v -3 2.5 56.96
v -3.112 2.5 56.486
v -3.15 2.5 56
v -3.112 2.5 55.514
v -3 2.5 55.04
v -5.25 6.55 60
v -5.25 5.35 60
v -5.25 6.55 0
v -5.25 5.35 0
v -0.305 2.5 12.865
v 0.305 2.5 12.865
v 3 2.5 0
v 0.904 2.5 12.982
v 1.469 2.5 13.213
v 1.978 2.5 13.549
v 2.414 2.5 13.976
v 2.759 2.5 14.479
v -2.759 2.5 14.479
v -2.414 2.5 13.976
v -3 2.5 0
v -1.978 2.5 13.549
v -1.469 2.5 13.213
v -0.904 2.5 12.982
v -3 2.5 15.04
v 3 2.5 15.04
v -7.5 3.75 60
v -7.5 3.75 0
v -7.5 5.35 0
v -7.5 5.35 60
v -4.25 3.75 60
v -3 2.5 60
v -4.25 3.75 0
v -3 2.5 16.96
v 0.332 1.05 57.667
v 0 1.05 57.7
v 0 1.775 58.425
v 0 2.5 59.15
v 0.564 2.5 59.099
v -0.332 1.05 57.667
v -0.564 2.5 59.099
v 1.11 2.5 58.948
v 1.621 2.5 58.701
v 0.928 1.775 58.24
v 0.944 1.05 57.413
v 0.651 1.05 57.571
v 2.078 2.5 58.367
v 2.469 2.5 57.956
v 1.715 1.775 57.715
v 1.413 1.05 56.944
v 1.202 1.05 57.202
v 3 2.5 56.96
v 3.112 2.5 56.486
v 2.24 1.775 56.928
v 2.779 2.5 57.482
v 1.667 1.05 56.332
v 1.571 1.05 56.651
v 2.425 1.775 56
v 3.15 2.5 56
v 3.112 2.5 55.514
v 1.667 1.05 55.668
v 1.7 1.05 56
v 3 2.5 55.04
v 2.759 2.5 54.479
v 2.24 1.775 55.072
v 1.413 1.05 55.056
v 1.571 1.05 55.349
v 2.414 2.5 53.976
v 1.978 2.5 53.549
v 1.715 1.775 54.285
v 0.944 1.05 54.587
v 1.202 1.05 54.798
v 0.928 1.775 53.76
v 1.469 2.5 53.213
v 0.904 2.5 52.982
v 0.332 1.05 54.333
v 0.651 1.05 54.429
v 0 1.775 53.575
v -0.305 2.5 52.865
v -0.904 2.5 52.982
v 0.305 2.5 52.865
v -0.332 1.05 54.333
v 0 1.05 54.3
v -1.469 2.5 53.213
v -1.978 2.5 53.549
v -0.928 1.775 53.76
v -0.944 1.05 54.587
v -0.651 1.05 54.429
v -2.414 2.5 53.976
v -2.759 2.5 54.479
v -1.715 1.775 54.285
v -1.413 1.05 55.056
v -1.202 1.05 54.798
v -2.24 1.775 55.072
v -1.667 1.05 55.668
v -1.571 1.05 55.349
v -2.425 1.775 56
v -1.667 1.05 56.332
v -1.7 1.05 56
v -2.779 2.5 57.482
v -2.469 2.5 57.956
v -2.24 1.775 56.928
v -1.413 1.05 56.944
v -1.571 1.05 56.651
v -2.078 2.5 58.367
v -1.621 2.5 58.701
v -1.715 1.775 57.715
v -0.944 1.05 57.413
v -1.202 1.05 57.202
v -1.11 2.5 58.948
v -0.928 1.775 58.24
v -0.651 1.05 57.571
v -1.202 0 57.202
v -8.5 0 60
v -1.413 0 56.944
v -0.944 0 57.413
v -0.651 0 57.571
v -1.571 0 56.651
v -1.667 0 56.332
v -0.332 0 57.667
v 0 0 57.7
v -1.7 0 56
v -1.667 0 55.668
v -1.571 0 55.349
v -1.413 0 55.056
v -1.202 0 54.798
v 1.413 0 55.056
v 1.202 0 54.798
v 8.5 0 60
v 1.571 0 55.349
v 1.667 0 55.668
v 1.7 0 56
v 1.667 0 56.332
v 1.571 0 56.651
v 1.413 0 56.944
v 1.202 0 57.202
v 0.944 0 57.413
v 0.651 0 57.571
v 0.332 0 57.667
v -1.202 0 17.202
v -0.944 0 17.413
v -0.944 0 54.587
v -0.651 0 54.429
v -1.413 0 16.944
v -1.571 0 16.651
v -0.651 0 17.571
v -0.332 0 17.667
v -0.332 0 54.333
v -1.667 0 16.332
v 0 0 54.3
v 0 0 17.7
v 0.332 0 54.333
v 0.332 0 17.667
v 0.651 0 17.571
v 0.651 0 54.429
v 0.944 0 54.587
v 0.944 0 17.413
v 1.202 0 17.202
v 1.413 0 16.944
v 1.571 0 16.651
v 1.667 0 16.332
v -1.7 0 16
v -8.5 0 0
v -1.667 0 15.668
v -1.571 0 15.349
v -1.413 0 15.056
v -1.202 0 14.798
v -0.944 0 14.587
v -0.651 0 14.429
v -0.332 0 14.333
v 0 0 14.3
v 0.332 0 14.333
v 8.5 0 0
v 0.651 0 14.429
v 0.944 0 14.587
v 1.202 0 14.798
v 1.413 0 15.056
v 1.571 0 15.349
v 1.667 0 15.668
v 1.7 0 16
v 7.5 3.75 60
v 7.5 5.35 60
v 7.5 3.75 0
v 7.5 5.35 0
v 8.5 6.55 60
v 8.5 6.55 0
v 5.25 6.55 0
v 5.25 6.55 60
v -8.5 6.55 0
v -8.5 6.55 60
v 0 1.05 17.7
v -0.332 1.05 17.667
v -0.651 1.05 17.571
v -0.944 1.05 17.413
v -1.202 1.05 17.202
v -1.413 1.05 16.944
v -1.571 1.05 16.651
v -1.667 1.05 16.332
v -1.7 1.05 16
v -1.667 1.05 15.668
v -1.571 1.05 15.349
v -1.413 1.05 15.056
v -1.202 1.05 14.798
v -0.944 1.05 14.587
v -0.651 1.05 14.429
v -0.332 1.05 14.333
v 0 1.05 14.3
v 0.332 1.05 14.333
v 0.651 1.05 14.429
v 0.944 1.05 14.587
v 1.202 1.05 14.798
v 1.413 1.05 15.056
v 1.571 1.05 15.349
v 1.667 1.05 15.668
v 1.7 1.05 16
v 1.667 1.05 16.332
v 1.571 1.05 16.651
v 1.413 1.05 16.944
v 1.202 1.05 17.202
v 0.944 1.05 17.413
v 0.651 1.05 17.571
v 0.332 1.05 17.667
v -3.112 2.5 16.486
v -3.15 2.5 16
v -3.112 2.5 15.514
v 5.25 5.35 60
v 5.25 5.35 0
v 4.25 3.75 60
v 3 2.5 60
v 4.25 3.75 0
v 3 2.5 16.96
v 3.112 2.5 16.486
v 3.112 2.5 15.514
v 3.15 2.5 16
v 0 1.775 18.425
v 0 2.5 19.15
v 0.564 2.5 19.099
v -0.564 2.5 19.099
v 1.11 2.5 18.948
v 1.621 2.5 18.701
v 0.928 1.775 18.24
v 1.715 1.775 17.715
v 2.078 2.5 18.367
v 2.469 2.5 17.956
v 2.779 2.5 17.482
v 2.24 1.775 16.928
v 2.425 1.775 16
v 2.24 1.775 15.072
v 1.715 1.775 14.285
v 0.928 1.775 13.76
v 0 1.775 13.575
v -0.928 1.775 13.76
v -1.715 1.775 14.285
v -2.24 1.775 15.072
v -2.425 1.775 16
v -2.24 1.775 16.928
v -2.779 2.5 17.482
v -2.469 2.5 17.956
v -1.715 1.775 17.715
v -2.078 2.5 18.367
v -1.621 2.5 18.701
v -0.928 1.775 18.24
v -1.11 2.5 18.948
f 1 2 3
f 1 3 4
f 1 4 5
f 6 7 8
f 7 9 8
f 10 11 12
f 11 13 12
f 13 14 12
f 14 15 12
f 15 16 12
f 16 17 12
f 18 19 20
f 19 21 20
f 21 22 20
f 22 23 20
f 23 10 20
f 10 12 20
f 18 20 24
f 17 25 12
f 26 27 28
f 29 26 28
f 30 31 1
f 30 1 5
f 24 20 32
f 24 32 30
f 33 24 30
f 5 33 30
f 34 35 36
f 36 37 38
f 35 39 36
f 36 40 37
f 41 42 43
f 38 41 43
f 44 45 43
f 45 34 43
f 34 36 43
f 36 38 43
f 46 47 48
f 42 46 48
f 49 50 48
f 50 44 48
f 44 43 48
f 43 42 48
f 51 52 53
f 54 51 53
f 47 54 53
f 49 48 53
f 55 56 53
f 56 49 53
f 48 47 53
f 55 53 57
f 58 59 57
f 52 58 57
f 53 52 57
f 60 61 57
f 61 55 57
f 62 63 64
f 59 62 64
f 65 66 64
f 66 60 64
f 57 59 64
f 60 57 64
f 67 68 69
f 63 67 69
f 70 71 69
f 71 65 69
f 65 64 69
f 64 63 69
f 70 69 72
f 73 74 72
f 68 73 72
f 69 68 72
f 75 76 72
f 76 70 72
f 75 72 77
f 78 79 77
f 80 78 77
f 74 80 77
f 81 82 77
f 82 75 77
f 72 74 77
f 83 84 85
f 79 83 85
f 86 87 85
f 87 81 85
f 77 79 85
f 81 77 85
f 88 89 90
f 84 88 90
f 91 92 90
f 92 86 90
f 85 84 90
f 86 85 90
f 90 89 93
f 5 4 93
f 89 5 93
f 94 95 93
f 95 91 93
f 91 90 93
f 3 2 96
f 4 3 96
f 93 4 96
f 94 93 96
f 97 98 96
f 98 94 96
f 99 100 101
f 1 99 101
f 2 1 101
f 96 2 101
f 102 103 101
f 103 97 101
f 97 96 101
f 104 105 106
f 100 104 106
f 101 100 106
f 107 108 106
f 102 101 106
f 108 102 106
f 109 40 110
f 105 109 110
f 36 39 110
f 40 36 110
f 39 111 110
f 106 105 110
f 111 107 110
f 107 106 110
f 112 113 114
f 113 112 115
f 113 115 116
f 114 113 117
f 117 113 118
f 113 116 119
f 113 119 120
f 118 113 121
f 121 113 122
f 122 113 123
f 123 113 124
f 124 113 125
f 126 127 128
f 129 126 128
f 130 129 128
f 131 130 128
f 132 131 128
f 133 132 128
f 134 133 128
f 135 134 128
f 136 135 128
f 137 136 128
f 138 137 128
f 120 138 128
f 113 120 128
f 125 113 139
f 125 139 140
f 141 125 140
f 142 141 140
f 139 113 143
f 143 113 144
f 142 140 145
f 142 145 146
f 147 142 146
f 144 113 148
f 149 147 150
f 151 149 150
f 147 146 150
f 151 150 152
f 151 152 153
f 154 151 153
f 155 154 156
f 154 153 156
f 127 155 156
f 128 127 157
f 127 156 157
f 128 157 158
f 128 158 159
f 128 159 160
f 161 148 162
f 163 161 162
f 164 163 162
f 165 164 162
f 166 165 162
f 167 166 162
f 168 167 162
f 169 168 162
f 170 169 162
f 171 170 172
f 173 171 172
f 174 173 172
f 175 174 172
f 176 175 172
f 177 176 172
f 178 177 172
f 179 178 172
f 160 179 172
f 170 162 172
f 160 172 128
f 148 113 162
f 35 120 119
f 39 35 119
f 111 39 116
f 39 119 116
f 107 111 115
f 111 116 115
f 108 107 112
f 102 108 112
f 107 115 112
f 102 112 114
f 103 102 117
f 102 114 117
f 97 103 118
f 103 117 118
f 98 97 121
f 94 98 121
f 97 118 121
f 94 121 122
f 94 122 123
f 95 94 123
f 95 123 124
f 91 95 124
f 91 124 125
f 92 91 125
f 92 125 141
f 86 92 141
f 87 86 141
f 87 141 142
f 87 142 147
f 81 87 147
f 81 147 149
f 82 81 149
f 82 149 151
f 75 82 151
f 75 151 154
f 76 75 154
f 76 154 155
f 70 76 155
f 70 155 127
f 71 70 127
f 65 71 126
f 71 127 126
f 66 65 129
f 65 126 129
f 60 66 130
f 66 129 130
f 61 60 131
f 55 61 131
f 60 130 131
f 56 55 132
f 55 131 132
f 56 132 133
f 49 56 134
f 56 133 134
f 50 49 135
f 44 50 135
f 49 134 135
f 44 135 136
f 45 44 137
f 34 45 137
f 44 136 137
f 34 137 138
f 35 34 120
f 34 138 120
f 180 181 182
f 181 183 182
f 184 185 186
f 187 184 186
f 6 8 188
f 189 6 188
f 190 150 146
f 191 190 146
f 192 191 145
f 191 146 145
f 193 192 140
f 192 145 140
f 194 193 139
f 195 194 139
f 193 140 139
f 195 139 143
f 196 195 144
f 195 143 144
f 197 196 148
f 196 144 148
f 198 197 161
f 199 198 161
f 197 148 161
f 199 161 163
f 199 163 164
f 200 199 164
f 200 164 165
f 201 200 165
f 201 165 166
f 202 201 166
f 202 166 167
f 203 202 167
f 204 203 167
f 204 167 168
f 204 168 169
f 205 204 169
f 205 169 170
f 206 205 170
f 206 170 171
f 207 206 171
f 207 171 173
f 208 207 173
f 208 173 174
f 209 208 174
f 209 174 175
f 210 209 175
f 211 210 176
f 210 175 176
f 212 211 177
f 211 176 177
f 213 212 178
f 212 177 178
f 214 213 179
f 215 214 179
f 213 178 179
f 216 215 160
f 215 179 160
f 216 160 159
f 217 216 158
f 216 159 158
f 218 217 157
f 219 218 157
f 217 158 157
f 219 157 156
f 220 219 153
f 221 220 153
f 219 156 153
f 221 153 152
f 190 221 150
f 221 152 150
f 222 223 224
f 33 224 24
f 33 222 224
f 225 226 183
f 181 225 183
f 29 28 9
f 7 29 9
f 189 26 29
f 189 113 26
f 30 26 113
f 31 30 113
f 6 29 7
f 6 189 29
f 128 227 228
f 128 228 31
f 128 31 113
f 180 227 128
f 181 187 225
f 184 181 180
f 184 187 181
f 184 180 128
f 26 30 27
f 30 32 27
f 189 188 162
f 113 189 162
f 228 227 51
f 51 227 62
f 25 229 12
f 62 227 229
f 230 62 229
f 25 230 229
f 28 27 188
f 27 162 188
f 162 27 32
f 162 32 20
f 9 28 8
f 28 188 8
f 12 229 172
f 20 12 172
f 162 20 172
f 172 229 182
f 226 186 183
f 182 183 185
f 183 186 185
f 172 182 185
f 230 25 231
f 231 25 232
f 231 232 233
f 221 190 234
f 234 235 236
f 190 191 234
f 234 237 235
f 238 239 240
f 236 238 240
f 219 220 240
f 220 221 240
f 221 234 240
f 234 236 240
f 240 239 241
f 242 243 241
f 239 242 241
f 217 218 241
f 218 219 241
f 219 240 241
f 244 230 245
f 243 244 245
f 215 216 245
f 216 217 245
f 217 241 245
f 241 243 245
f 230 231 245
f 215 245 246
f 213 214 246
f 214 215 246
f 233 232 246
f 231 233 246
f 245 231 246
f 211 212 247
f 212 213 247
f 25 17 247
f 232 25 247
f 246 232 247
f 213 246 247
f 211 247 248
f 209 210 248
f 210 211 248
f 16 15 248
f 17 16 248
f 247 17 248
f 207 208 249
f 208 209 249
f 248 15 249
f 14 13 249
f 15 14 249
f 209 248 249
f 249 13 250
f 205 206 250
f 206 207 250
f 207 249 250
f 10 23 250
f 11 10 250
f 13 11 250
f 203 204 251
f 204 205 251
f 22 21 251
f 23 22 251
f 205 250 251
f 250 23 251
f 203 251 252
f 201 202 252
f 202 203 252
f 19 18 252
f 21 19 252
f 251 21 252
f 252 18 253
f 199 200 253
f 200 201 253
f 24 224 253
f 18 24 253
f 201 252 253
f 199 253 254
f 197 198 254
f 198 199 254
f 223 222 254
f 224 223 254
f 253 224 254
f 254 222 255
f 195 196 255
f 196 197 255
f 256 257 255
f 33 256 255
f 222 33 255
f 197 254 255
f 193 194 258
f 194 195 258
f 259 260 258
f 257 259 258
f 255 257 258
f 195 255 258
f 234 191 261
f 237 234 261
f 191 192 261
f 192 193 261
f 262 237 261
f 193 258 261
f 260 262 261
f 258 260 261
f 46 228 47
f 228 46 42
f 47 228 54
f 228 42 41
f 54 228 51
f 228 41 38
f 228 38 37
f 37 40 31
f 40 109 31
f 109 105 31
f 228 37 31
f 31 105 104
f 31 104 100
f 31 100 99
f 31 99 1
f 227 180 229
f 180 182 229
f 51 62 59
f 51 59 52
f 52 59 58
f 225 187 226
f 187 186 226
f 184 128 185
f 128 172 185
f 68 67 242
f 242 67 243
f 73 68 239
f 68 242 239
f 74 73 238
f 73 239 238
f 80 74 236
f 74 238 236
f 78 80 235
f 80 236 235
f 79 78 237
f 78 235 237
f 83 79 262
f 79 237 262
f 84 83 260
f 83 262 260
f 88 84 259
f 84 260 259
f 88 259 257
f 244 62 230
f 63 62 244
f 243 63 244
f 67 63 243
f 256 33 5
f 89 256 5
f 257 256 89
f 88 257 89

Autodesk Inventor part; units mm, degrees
ref_plane "YZ Plane" through (0, 0, 0) normal (1, 0, 0) x (0, 1, 0)
ref_plane "XZ Plane" through (0, 0, 0) normal (0, 1, 0) x (-1, 0, 0)
ref_plane "XY Plane" through (0, 0, 0) normal (0, 0, 1) x (1, 0, 0)
sketch "Skizze1" plane through (0, 0, 0) normal (0, 0, 1) x (1, 0, 0)
  line L0 (-7.5, 5.35) -> (-5.25, 5.35)
  line L1 (-5.25, 5.35) -> (-5.25, 6.55)
  line L2 (-5.25, 6.55) -> (-8.5, 6.55)
  line L3 (-8.5, 6.55) -> (-8.5, 0)
  line L4 (-8.5, 0) -> (0, 0)
  line L5 (0, 0) -> (0, 2.5)
  line L6 (-4.25, 3.75) -> (-7.5, 3.75)
  line L7 (-7.5, 3.75) -> (-7.5, 5.35)
  line L8 (0, 2.5) -> (-3, 2.5)
  line L9 (-3, 2.5) -> (-4.25, 3.75)
  dimension "d0" = 8.5
  dimension "d1" = 1.6
  dimension "d2" = 7.5
  dimension "d3" = 1.2
  dimension "d4" = 5.25
  dimension "d5" = 6.55
  dimension "d10" = 135
  dimension "d11" = 3
  dimension "d12" = 2.5
extrude "Extrusion1" add sketch "Skizze1" along normal blind 60
mirror "Spiegeln1" about plane through (0, 0, 0) normal (1, 0, 0) of "Extrusion1"
sketch "Skizze2" plane through (-3, 2.5, 60) normal (0, 1, 0) x (1, 0, 0)
  line L0 (3, 72) -> (3, -12) projected
  line L1 (0, 0) -> (6, 0) projected
  point P0 (3, 60)
  point P1 (3, 4)
  point P2 (3, 0)
  point P3 (3, 44)
  dimension "d13" = 4
  dimension "d14" = 40
hole "Bohrung1" at (0, 2.5, 56) at (0, 2.5, 16) direction (0, -1, 0) diameter 3.4 depth 2.5 countersink diameter 6.3 countersink angle 90 clearance for "Flachkopfmaschinenschraube" size "M3" standard "ANSI Metrisches M Profil"
properties part number "igus_schine"
